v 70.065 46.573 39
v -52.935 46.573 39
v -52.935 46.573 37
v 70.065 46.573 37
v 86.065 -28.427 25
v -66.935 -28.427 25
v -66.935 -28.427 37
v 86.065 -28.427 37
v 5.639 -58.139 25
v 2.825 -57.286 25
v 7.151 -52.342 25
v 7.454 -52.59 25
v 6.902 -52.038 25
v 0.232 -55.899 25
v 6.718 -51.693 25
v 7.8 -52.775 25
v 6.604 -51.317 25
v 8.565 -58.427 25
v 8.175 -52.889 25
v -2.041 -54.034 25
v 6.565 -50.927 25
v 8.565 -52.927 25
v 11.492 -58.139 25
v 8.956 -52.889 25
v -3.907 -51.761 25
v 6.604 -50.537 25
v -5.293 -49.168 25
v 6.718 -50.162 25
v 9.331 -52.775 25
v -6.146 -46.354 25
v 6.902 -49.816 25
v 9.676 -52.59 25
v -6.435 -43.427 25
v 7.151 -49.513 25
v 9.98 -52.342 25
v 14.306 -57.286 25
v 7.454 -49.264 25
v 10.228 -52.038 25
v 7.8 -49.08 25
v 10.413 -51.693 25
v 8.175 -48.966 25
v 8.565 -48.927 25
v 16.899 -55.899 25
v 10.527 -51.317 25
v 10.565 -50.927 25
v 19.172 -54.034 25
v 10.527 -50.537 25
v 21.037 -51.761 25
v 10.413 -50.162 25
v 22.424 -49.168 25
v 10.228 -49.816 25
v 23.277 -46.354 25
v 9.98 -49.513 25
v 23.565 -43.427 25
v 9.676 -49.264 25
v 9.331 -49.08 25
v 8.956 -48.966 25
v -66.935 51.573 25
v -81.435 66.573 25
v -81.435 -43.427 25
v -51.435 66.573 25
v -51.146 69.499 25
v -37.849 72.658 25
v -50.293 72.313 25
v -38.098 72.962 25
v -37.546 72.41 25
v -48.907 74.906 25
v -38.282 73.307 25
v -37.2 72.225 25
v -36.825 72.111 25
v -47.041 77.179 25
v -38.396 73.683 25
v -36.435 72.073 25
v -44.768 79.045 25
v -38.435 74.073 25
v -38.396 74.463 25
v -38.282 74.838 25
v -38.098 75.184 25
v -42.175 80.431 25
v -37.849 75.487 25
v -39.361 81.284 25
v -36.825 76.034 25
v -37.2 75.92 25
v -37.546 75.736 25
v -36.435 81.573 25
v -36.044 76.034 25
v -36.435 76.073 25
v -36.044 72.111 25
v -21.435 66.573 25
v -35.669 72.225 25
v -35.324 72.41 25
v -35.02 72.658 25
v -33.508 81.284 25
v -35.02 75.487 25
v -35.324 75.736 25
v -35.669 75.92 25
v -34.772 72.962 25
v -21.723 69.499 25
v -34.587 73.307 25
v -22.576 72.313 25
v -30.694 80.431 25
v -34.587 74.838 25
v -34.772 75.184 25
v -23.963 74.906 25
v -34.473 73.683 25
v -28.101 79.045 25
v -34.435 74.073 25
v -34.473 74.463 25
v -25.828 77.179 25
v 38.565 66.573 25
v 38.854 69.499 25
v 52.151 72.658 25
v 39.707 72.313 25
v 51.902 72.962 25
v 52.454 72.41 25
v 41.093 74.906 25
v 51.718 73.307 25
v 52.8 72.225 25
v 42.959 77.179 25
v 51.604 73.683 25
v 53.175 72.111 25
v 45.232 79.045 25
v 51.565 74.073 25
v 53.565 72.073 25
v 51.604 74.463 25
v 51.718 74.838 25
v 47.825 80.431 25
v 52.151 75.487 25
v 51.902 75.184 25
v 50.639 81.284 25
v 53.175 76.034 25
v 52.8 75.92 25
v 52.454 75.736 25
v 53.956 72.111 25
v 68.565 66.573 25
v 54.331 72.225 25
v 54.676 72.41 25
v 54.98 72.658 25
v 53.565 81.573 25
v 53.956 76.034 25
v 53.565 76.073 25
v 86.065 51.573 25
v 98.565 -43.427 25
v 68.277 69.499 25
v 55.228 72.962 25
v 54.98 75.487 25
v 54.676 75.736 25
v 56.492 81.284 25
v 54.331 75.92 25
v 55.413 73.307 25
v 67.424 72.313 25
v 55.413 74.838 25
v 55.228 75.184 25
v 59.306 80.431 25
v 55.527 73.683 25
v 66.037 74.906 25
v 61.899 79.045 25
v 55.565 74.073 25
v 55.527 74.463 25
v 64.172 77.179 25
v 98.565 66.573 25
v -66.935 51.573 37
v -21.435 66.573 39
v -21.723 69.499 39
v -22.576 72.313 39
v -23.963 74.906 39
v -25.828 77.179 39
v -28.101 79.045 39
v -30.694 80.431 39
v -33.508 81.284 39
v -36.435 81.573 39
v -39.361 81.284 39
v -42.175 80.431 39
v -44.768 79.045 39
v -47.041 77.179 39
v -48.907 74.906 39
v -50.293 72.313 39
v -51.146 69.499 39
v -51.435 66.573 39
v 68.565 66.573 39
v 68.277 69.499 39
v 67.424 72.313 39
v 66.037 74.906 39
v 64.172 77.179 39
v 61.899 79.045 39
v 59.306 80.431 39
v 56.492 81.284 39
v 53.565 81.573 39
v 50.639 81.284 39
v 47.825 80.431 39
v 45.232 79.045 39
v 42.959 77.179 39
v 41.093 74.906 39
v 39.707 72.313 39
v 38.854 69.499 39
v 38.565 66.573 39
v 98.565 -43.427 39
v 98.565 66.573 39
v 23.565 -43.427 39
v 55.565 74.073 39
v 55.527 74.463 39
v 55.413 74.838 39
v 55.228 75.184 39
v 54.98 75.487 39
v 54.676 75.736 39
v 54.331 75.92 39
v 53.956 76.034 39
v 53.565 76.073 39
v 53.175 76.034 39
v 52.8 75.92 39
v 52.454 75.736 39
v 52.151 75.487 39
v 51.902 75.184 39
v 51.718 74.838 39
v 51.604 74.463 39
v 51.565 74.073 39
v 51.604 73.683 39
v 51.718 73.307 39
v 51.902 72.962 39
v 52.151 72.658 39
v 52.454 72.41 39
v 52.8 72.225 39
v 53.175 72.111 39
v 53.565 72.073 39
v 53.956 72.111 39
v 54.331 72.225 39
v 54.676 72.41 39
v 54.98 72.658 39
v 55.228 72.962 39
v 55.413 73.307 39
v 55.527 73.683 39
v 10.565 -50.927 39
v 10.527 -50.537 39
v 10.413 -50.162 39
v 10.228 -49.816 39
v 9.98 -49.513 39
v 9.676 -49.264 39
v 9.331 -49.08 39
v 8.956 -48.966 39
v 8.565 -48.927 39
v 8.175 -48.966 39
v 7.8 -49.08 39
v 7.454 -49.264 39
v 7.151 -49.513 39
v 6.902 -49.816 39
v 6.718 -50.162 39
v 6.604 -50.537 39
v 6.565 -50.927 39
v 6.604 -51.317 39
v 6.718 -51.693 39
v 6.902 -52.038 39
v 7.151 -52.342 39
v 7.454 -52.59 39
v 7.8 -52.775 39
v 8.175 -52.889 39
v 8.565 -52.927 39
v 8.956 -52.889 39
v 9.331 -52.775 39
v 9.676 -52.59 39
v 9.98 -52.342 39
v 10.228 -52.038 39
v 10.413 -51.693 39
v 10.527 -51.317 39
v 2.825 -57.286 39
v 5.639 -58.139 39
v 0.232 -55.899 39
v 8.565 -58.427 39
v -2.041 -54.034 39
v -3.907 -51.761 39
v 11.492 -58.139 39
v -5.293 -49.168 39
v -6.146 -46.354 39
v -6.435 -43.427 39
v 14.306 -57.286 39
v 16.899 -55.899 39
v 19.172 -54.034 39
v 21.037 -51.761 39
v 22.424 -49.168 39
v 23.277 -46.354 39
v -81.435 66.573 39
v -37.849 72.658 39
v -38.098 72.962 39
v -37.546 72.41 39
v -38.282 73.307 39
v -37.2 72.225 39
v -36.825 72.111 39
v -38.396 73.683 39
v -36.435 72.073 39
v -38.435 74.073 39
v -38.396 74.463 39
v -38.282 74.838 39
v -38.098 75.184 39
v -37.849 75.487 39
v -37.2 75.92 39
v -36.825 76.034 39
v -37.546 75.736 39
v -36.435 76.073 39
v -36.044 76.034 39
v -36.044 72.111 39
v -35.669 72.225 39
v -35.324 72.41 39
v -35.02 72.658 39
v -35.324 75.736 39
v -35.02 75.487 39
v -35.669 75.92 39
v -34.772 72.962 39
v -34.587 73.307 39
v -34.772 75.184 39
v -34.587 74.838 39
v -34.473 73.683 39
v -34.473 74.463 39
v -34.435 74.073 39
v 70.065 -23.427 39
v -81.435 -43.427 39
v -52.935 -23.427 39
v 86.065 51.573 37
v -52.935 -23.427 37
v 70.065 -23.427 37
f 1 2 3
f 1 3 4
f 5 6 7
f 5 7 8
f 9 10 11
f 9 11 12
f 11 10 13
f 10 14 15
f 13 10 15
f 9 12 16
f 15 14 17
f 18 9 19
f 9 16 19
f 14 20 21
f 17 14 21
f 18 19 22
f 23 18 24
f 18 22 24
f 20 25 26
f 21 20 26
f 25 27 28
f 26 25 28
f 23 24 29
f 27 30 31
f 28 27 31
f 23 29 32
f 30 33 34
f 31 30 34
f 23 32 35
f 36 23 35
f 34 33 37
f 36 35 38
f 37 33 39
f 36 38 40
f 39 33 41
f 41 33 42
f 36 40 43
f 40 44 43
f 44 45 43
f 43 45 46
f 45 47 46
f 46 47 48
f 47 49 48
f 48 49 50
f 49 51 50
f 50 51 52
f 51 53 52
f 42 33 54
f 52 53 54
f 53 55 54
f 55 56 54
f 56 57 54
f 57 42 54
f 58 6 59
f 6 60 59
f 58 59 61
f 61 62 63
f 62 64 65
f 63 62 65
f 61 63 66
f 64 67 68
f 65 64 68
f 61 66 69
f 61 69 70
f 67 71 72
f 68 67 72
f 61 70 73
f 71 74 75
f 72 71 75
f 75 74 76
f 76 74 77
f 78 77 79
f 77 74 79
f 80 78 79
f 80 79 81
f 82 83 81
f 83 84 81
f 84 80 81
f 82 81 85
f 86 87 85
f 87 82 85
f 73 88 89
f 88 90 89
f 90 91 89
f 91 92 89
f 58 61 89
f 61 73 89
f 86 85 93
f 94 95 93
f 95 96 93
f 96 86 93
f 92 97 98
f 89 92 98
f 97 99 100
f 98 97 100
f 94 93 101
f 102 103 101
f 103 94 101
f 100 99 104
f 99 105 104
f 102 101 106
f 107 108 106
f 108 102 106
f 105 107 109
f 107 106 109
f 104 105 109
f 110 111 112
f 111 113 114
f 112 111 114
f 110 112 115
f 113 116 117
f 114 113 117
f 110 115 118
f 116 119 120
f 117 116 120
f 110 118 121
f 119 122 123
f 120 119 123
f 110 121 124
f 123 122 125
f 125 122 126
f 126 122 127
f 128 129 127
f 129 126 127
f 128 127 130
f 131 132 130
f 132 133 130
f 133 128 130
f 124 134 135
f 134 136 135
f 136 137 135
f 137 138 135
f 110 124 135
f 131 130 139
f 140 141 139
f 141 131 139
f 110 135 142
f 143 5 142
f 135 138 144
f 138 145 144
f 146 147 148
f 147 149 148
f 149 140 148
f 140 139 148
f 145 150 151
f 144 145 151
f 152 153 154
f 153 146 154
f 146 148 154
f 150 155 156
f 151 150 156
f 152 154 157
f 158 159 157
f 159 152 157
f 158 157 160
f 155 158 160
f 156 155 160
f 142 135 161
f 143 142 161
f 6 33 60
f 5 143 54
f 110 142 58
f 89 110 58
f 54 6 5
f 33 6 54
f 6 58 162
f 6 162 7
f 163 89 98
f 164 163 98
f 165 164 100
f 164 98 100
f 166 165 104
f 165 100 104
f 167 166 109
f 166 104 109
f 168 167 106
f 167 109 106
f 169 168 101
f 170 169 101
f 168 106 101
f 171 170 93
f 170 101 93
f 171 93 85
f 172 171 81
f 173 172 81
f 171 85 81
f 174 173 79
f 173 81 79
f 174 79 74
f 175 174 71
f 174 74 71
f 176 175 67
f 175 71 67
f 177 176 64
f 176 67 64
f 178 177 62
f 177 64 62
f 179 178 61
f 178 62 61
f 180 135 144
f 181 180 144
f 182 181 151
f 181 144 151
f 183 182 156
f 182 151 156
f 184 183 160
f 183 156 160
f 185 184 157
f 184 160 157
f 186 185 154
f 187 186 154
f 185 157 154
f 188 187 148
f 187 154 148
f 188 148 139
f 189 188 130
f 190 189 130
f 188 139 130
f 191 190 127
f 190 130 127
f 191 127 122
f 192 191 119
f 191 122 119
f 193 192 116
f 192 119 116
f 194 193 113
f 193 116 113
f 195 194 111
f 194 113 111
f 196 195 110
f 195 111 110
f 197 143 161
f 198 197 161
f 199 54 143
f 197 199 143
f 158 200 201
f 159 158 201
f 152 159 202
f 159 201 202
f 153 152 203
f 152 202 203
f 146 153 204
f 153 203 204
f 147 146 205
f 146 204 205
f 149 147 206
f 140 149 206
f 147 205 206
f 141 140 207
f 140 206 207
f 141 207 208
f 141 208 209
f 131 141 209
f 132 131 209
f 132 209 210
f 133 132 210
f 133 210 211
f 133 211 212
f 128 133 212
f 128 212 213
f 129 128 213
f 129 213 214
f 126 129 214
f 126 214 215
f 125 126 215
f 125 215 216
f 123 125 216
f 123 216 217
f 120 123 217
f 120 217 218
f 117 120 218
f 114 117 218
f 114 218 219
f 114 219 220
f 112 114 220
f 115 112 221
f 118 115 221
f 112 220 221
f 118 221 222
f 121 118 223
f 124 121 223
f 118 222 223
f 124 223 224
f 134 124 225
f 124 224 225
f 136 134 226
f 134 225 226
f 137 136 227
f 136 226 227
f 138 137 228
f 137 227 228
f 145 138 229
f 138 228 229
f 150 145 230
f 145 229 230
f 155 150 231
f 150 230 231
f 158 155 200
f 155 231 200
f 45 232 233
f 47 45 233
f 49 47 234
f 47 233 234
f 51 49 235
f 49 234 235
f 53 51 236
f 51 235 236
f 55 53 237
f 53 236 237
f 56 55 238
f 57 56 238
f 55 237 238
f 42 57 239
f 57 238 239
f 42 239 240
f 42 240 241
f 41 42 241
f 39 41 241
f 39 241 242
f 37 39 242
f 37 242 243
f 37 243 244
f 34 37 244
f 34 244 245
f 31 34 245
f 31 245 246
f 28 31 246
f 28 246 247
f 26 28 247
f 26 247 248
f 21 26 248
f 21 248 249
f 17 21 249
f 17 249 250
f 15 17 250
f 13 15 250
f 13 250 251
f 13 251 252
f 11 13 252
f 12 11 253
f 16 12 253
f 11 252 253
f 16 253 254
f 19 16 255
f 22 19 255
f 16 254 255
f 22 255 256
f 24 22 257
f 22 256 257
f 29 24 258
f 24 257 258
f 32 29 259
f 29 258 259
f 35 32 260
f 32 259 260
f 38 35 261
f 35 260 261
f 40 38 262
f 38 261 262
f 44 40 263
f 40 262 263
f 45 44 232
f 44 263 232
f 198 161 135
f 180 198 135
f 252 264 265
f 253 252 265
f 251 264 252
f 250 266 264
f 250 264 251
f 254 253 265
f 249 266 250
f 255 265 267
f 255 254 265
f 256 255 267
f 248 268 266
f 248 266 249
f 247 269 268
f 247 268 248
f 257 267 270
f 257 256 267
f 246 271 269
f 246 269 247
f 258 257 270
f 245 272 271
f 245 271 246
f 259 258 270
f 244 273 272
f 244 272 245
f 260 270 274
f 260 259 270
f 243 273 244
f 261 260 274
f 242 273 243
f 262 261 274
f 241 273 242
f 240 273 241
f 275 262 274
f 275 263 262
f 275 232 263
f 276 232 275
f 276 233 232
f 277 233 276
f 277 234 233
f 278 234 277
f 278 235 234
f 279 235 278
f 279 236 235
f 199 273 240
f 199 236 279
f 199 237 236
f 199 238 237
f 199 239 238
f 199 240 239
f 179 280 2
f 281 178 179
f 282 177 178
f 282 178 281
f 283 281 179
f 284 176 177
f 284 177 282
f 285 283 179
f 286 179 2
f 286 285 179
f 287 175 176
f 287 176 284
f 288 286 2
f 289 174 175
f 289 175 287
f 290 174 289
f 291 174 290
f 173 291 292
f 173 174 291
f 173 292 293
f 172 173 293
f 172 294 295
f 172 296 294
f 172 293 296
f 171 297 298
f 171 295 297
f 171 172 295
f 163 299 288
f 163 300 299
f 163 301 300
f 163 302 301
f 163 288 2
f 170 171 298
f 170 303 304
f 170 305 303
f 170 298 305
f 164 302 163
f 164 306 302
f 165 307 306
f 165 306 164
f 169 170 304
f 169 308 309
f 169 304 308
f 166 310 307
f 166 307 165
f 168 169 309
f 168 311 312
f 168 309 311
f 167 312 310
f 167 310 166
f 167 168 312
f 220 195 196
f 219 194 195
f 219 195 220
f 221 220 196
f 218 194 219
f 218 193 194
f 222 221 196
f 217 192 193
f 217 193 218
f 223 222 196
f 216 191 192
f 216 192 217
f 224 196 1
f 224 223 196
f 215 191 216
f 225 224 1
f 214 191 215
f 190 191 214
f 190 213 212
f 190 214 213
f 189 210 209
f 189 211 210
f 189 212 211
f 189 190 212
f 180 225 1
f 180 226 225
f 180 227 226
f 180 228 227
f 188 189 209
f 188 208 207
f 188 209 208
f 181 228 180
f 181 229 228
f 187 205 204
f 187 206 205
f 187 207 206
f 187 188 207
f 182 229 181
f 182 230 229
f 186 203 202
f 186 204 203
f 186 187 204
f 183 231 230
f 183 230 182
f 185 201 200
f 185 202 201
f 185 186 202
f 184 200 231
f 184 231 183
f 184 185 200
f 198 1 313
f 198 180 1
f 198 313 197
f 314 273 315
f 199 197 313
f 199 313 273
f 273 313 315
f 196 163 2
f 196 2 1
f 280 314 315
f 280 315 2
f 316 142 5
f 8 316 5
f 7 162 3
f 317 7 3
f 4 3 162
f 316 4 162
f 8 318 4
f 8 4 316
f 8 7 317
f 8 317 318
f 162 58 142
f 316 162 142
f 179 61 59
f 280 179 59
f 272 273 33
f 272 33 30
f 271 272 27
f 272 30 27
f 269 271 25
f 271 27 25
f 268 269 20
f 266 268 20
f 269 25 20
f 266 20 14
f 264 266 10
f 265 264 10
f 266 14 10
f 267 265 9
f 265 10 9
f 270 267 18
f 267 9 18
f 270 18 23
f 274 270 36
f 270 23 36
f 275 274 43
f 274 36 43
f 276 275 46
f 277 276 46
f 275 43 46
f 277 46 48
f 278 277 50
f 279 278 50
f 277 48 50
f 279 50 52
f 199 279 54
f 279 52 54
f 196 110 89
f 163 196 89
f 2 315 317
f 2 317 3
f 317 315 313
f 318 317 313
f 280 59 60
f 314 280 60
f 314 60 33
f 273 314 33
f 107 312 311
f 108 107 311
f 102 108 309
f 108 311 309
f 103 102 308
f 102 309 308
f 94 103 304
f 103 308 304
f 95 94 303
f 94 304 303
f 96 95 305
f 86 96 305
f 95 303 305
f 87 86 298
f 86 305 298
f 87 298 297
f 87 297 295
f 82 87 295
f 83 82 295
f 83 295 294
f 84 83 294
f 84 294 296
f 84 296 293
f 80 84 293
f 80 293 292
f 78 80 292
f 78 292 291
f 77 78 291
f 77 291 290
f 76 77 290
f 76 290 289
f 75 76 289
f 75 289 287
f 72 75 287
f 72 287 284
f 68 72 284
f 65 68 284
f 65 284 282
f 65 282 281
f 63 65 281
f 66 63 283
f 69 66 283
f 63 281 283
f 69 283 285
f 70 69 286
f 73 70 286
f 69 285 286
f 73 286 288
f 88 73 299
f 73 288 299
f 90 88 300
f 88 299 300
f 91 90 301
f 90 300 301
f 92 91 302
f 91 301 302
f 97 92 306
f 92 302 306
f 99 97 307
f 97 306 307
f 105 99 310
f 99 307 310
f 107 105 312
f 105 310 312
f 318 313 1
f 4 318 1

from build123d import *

# Parameters (mm, degrees)
F0_R      = 2
F1_DEPTH  = 25
F3_DEPTH  = 276
F4_R      = 2
F5_DEPTH  = 84.8
F6_R      = 2.5
F7_DEPTH  = 5
F9_DEPTH  = 14
F11_W     = 123
F11_H     = 70
F12_DEPTH = 25
F13_W     = 153
F13_H     = 80
F14_DEPTH = 12
F15_R     = 2
F16_DEPTH = 25


with BuildPart() as f1:
    # F0 (on Top) → F1 (new body)
    with BuildSketch(Plane.XY):
        with BuildLine():
            Line((-51.434658, 66.572686), (-81.434658, 66.572686))
            Line((-81.434658, 66.572686), (-81.434658, -43.427314))
            Line((-81.434658, -43.427314), (-6.434658, -43.427314))
            ThreePointArc((-6.434658, -43.427314), (8.565342, -58.427314), (23.565342, -43.427314))
            Line((23.565342, -43.427314), (98.565342, -43.427314))
            Line((98.565342, -43.427314), (98.565342, 66.572686))
            Line((98.565342, 66.572686), (68.565342, 66.572686))
            ThreePointArc((68.565342, 66.572686), (53.565342, 81.572686), (38.565342, 66.572686))
            Line((38.565342, 66.572686), (-21.434658, 66.572686))
            ThreePointArc((-21.434658, 66.572686), (-36.434658, 81.572686), (-51.434658, 66.572686))
        make_face()
        with Locations((8.565342, -50.927314)):
            Circle(F0_R, mode=Mode.SUBTRACT)
        with Locations((-36.434658, 74.072686)):
            Circle(F0_R, mode=Mode.SUBTRACT)
        with Locations((53.565342, 74.072686)):
            Circle(F0_R, mode=Mode.SUBTRACT)
    extrude(amount=F1_DEPTH)

    # F2 (on face) → F3 (cut)
    with BuildSketch(Plane.YZ.offset(98.565342)):
        with BuildLine():
            Line((43.145373, 0), (22.822686, 0))
            ThreePointArc((22.822686, 0), (11.572686, 11.25), (0.322686, 0))
            Line((0.322686, 0), (-20, 0))
            ThreePointArc((-20, 0), (-41.231841, 11.150842), (-64.902842, 15))
            Line((-64.902842, 15), (-64.902842, -16.413443))
            Line((-64.902842, -16.413443), (88.048215, -16.413443))
            Line((88.048215, -16.413443), (88.048215, 15))
            ThreePointArc((88.048215, 15), (64.377213, 11.150842), (43.145373, 0))
        make_face()
    extrude(amount=-F3_DEPTH, mode=Mode.SUBTRACT)

    # F4 (on face) → F5 (cut)
    with BuildSketch(Plane.XY.offset(25)):
        with Locations((-56.434658, 32.872686)):
            Circle(F4_R)
        with Locations((73.565342, 32.872686)):
            Circle(F4_R)
        with Locations((-56.434658, -9.727314)):
            Circle(F4_R)
        with Locations((73.565342, -9.727314)):
            Circle(F4_R)
    extrude(amount=-F5_DEPTH, mode=Mode.SUBTRACT)

    # F6 (on face) → F7 (cut)
    with BuildSketch(Plane.XY.offset(25)):
        with Locations((-56.434658, 32.872686)):
            Circle(F6_R)
        with Locations((73.565342, 32.872686)):
            Circle(F6_R)
        with Locations((73.565342, -9.727314)):
            Circle(F6_R)
        with Locations((-56.434658, -9.727314)):
            Circle(F6_R)
    extrude(amount=-F7_DEPTH, mode=Mode.SUBTRACT)


with BuildPart() as f9:
    # F8 (on face) → F9 (new body)
    with BuildSketch(Plane.XY.offset(25)):
        with BuildLine():
            Line((-81.434658, -43.427314), (-6.434658, -43.427314))
            ThreePointArc((-6.434658, -43.427314), (8.565342, -58.427314), (23.565342, -43.427314))
            Line((23.565342, -43.427314), (98.565342, -43.427314))
            Line((98.565342, -43.427314), (98.565342, 66.572686))
            Line((98.565342, 66.572686), (68.565342, 66.572686))
            ThreePointArc((68.565342, 66.572686), (53.565342, 81.572686), (38.565342, 66.572686))
            Line((38.565342, 66.572686), (-21.434658, 66.572686))
            ThreePointArc((-21.434658, 66.572686), (-36.434658, 81.572686), (-51.434658, 66.572686))
            Line((-51.434658, 66.572686), (-81.434658, 66.572686))
            Line((-81.434658, 66.572686), (-81.434658, -43.427314))
        make_face()
    extrude(amount=F9_DEPTH)

    # F11 (on face) → F12 (cut)
    with BuildSketch(Plane.XY.offset(39)):
        with Locations((8.565342, 11.572686)):
            Rectangle(F11_W, F11_H)
    extrude(amount=-F12_DEPTH, mode=Mode.SUBTRACT)

    # F13 (on face) → F14 (cut)
    with BuildSketch(Plane(origin=(0, 0, 25), x_dir=(1, 0, 0), z_dir=(0, 0, -1))):
        with Locations((9.565342, -11.572686)):
            Rectangle(F13_W, F13_H)
    extrude(amount=-F14_DEPTH, mode=Mode.SUBTRACT)

    # F15 (on face) → F16 (cut)
    with BuildSketch(Plane.XY.offset(39)):
        with Locations((53.565342, 74.072686)):
            Circle(F15_R)
        with Locations((-36.434658, 74.072686)):
            Circle(F15_R)
        with Locations((8.565342, -50.927314)):
            Circle(F15_R)
    extrude(amount=-F16_DEPTH, mode=Mode.SUBTRACT)


solid = f9.part
